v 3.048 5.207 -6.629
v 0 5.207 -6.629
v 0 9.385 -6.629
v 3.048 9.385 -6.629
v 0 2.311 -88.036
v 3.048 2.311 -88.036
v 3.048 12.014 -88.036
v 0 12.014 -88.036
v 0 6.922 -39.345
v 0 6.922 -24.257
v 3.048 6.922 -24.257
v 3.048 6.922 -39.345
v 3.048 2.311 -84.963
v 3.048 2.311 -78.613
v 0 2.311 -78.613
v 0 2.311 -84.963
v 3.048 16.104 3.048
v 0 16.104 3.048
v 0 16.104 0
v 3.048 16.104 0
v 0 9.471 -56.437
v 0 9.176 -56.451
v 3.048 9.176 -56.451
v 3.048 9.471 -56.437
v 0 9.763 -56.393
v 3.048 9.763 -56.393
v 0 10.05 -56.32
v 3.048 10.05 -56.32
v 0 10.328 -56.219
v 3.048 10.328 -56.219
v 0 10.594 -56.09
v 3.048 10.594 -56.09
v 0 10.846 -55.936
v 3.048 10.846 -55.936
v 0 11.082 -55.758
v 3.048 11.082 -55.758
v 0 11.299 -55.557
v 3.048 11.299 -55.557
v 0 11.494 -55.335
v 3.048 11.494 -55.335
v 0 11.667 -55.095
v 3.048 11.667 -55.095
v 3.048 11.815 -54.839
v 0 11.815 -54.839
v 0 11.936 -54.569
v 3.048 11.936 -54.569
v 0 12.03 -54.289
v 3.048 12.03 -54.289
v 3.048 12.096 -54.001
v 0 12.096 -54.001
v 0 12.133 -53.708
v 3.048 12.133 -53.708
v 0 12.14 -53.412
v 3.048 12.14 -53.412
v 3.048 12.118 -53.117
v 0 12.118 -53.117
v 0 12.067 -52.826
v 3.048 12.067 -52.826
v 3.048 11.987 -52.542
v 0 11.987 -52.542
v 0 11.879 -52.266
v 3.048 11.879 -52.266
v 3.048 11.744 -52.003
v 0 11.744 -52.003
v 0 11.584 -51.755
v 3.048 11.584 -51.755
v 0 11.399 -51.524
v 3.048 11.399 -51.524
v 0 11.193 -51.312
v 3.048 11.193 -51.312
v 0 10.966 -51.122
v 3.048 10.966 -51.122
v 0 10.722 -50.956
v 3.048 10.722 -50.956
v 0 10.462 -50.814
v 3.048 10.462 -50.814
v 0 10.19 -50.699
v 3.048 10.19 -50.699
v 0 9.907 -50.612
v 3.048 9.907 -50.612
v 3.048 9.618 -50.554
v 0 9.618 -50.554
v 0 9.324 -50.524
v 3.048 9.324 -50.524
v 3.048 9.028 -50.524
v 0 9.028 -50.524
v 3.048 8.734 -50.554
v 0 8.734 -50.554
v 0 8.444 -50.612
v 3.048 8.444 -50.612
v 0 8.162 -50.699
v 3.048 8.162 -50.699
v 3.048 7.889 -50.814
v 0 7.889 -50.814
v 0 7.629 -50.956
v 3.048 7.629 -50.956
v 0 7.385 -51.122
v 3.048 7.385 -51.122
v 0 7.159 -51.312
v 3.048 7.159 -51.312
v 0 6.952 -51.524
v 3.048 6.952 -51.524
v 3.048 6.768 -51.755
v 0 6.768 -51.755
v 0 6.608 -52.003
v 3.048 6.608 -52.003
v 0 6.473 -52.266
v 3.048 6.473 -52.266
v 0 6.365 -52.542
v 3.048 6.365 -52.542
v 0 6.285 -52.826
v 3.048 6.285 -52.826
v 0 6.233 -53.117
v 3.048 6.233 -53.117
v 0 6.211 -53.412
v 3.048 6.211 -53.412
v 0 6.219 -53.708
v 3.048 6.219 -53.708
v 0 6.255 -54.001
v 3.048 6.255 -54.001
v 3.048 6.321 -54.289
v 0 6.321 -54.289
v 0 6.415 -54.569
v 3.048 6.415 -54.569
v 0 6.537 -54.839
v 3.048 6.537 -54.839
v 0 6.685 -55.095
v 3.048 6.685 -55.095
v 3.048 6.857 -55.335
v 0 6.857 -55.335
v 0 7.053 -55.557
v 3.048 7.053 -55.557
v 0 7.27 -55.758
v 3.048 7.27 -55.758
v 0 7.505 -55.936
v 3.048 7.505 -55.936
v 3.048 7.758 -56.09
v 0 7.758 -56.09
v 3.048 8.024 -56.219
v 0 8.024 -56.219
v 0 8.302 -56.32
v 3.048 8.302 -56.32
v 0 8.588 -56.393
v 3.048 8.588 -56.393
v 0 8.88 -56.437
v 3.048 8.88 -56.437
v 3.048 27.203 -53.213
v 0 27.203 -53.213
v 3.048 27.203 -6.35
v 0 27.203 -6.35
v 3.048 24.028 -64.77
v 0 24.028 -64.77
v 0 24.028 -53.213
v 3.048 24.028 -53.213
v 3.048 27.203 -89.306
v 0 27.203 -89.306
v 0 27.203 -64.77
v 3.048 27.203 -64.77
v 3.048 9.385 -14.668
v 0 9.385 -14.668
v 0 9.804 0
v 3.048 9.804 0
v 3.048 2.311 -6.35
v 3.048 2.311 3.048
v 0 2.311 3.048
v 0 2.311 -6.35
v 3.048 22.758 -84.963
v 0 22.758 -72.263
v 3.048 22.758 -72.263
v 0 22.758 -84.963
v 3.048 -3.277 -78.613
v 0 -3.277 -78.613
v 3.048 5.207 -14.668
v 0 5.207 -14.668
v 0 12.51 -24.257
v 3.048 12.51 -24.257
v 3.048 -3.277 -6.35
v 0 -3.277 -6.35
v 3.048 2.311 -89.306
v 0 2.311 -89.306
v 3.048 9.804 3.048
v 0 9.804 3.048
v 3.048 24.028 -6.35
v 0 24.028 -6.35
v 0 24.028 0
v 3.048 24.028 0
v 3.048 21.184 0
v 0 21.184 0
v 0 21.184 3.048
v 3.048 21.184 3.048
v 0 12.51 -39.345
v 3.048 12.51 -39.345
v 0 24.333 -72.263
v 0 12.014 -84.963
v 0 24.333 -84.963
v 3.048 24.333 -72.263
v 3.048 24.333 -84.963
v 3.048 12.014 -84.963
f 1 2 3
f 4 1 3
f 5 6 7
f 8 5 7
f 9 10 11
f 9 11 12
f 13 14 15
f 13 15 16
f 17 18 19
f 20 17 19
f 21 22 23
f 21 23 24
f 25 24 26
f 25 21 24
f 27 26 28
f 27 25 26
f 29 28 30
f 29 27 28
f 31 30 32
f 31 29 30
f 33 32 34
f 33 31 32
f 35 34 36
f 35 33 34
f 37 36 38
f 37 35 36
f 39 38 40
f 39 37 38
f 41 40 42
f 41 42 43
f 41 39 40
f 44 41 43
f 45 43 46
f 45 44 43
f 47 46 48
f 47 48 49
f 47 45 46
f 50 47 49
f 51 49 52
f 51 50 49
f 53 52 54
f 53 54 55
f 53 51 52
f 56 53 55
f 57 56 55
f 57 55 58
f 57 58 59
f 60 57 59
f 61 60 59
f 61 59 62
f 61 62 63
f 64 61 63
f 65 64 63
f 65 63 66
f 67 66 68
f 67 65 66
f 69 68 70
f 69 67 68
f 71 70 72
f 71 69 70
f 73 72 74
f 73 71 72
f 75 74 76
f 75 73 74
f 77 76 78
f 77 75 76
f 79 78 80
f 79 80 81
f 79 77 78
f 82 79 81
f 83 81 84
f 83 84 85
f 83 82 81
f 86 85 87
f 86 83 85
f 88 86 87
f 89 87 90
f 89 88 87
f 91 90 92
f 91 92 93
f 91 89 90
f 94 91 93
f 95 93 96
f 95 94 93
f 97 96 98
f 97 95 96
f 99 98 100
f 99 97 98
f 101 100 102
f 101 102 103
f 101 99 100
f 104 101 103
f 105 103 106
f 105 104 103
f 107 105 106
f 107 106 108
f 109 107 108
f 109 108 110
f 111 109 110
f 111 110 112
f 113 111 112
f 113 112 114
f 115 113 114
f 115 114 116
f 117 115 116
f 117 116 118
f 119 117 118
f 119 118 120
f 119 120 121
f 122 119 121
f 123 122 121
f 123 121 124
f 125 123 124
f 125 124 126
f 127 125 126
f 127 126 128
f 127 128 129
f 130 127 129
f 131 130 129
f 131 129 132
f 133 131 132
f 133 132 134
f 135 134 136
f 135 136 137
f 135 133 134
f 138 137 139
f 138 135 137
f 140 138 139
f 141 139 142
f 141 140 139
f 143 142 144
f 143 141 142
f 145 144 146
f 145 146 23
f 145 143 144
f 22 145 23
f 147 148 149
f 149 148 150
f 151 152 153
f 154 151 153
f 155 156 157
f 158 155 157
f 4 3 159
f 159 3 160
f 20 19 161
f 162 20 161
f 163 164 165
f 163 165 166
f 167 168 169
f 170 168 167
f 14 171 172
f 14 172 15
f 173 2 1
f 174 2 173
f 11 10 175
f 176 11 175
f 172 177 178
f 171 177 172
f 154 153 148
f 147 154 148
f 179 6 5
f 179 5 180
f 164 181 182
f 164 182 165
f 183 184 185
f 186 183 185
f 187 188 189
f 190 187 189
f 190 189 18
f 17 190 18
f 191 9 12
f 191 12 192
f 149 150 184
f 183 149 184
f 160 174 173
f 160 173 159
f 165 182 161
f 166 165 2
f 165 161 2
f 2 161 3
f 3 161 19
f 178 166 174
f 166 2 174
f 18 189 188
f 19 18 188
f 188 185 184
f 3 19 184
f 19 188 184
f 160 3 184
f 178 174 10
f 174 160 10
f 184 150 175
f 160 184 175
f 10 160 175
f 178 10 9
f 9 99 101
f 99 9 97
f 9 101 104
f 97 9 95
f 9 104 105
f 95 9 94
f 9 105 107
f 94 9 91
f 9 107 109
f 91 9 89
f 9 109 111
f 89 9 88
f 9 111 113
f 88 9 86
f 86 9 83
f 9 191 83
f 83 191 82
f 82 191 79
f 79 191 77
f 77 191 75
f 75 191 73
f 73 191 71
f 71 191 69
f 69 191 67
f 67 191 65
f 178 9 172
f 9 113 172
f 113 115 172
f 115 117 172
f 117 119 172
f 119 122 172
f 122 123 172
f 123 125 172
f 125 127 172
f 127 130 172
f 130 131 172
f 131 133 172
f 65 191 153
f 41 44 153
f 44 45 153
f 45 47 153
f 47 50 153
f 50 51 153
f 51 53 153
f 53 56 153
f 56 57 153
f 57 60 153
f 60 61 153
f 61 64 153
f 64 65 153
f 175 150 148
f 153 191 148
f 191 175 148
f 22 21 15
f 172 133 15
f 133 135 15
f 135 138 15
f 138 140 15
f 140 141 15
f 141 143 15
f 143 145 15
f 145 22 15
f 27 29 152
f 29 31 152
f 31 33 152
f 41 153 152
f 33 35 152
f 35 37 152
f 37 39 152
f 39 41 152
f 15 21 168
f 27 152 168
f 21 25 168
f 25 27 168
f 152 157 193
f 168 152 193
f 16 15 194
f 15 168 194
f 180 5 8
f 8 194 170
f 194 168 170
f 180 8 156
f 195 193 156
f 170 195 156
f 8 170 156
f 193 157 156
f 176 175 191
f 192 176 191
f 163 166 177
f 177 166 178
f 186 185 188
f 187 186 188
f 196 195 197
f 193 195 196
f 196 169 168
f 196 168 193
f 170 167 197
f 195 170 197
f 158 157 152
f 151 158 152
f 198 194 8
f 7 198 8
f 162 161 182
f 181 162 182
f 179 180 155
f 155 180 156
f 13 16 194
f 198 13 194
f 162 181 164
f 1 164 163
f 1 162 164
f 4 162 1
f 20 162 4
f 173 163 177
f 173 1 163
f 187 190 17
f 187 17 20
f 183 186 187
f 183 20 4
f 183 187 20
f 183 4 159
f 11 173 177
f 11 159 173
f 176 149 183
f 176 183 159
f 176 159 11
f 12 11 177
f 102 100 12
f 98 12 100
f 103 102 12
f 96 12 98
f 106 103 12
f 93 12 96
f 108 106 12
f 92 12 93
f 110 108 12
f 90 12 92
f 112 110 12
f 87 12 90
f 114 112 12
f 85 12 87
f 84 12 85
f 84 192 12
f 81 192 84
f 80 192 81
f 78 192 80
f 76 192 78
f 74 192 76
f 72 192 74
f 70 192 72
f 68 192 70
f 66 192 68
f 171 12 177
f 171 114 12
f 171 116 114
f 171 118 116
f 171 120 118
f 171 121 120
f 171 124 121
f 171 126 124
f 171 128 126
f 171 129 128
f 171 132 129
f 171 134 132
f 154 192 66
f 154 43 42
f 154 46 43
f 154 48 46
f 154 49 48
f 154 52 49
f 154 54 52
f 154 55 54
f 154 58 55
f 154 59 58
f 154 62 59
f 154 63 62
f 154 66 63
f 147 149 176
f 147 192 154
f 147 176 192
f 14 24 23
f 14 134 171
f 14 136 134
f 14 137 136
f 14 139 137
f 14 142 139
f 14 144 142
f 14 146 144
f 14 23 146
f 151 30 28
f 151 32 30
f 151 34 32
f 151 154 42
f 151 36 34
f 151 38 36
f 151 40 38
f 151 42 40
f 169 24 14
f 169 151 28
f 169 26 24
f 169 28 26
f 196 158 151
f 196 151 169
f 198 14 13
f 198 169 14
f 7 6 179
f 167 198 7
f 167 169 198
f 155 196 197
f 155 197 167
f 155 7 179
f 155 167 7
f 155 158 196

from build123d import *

# Parameters (mm, degrees)
SKETCH2_W                    = 12.7
SKETCH2_H                    = 1.8034
SKETCH2_W_2                  = 8.0391
SKETCH2_H_2                  = 4.1783
SKETCH2_W_3                  = 15.0876
SKETCH2_H_3                  = 5.588
SKETCH2_R                    = 2.96545
BOSS_EXTRUDE1_DEPTH          = 3.048
SKETCH3_W                    = 12.7
SKETCH3_H                    = 0.2286
MADE_HOOD_SLOT_SMALLER_DEPTH = 3.048
SKETCH5_W                    = 3.0734
SKETCH5_H                    = 7.2898
CUT_EXTRUDE1_DEPTH           = 4.048
SKETCH7_W                    = 1.27
SKETCH7_H                    = 2.413
BOSS_EXTRUDE2_DEPTH          = 3.048


with BuildPart() as part:
    # Sketch2 → Boss-Extrude1 (new body)
    with BuildSketch(Plane(origin=(0, 0, 0), x_dir=(0, 0, -1), z_dir=(1, 0, 0))):
        Polygon((6.35, 24.0284), (0, 24.0284), (0, 21.1836), (-3.048, 21.1836), (-3.048, 16.1036), (0, 16.1036), (0, 9.8044), (-3.048, 9.8044), (-3.048, 4.7244), (6.35, 4.7244), (6.35, 1.5494), (46.863, 1.5494), (46.863, 4.7244), (84.963, 4.7244), (84.963, 12.0142), (86.7664, 12.0142), (86.7664, 4.7244), (89.3064, 4.7244), (89.3064, 27.2034), (64.77, 27.2034), (64.77, 24.0284), (53.213, 24.0284), (53.213, 27.2034), (6.35, 27.2034), align=None)
        with Locations((78.613, 23.6601)):
            Rectangle(SKETCH2_W, SKETCH2_H, mode=Mode.SUBTRACT)
        with Locations((10.64895, 7.29615)):
            Rectangle(SKETCH2_W_2, SKETCH2_H_2, mode=Mode.SUBTRACT)
        with Locations((31.8008, 9.7155)):
            Rectangle(SKETCH2_W_3, SKETCH2_H_3, mode=Mode.SUBTRACT)
        with Locations((53.48605, 9.17575)):
            Circle(SKETCH2_R, mode=Mode.SUBTRACT)
    extrude(amount=BOSS_EXTRUDE1_DEPTH)

    # Sketch3 → made hood slot smaller (add)
    with BuildSketch(Plane.ZY):
        with Locations((-78.613, 24.4475)):
            Rectangle(SKETCH3_W, SKETCH3_H)
    extrude(amount=-MADE_HOOD_SLOT_SMALLER_DEPTH)

    # Sketch5 → Cut-Extrude1 (cut, through all)
    with BuildSketch(Plane(origin=(3.048, 0, 0), x_dir=(0, 0, -1), z_dir=(1, 0, 0))):
        with Locations((86.4997, 8.3693)):
            Rectangle(SKETCH5_W, SKETCH5_H)
    extrude(amount=-CUT_EXTRUDE1_DEPTH, mode=Mode.SUBTRACT)

    # Sketch7 → Boss-Extrude2 (add)
    with BuildSketch(Plane(origin=(3.048, 0, 0), x_dir=(0, 0, -1), z_dir=(1, 0, 0))):
        Polygon((-3.048, 4.7244), (-3.048, 2.3114), (6.35, 2.3114), (6.35, -3.2766), (78.613, -3.2766), (78.613, 2.3114), (84.963, 2.3114), (84.963, 4.7244), align=None)
        with Locations((88.6714, 3.5179)):
            Rectangle(SKETCH7_W, SKETCH7_H)
    extrude(amount=-BOSS_EXTRUDE2_DEPTH)


solid = part.part
